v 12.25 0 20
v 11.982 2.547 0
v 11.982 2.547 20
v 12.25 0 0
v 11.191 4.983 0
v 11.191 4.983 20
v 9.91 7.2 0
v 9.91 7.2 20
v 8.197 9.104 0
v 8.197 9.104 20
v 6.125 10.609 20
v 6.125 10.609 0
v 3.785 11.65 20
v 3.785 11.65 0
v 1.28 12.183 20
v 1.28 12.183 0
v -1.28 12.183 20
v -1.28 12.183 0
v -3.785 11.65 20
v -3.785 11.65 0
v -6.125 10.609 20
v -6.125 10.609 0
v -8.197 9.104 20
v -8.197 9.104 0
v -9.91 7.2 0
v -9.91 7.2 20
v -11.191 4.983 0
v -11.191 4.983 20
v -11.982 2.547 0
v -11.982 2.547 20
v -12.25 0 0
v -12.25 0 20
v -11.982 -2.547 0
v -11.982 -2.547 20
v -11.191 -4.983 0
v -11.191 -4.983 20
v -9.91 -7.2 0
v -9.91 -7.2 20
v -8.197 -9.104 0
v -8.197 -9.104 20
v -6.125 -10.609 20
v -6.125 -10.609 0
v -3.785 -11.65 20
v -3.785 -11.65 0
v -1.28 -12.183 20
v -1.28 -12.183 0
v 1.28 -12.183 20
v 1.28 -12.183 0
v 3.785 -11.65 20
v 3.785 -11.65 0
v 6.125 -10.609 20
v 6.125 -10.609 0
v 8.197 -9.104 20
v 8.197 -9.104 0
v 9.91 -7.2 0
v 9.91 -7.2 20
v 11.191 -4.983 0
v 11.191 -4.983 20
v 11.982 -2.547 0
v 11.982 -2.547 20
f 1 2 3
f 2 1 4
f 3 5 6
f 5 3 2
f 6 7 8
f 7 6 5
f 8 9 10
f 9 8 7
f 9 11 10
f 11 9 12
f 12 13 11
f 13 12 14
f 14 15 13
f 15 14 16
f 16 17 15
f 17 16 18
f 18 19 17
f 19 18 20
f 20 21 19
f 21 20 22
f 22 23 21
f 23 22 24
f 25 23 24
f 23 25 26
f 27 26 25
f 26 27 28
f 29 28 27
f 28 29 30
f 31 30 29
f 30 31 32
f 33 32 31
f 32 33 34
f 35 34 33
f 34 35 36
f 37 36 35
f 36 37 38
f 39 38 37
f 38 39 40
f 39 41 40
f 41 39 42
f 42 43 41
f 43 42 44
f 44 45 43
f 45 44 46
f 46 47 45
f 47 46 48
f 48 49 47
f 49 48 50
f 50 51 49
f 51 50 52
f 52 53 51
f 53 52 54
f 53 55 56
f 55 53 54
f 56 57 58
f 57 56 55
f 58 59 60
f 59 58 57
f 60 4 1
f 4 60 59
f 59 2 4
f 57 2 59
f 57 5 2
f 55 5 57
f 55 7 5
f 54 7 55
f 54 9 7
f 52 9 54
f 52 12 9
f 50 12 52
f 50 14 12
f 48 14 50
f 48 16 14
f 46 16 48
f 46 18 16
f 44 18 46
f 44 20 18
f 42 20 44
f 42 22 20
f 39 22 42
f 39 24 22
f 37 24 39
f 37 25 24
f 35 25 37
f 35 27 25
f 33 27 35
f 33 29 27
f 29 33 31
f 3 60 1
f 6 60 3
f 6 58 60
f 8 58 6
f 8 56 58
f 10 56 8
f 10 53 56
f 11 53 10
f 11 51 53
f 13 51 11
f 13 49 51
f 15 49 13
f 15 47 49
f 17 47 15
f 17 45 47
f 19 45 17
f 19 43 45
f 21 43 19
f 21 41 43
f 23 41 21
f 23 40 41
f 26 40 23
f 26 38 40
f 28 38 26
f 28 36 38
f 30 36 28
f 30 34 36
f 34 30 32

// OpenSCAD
rollborewidth=20; // rollwidth + 2*holdersupportwidth + 10;
tolerance=0.2;
diametertolerance=0.98;
rollborediameter=25;
  
cylinder(h=rollborewidth,d=rollborediameter*diametertolerance);
